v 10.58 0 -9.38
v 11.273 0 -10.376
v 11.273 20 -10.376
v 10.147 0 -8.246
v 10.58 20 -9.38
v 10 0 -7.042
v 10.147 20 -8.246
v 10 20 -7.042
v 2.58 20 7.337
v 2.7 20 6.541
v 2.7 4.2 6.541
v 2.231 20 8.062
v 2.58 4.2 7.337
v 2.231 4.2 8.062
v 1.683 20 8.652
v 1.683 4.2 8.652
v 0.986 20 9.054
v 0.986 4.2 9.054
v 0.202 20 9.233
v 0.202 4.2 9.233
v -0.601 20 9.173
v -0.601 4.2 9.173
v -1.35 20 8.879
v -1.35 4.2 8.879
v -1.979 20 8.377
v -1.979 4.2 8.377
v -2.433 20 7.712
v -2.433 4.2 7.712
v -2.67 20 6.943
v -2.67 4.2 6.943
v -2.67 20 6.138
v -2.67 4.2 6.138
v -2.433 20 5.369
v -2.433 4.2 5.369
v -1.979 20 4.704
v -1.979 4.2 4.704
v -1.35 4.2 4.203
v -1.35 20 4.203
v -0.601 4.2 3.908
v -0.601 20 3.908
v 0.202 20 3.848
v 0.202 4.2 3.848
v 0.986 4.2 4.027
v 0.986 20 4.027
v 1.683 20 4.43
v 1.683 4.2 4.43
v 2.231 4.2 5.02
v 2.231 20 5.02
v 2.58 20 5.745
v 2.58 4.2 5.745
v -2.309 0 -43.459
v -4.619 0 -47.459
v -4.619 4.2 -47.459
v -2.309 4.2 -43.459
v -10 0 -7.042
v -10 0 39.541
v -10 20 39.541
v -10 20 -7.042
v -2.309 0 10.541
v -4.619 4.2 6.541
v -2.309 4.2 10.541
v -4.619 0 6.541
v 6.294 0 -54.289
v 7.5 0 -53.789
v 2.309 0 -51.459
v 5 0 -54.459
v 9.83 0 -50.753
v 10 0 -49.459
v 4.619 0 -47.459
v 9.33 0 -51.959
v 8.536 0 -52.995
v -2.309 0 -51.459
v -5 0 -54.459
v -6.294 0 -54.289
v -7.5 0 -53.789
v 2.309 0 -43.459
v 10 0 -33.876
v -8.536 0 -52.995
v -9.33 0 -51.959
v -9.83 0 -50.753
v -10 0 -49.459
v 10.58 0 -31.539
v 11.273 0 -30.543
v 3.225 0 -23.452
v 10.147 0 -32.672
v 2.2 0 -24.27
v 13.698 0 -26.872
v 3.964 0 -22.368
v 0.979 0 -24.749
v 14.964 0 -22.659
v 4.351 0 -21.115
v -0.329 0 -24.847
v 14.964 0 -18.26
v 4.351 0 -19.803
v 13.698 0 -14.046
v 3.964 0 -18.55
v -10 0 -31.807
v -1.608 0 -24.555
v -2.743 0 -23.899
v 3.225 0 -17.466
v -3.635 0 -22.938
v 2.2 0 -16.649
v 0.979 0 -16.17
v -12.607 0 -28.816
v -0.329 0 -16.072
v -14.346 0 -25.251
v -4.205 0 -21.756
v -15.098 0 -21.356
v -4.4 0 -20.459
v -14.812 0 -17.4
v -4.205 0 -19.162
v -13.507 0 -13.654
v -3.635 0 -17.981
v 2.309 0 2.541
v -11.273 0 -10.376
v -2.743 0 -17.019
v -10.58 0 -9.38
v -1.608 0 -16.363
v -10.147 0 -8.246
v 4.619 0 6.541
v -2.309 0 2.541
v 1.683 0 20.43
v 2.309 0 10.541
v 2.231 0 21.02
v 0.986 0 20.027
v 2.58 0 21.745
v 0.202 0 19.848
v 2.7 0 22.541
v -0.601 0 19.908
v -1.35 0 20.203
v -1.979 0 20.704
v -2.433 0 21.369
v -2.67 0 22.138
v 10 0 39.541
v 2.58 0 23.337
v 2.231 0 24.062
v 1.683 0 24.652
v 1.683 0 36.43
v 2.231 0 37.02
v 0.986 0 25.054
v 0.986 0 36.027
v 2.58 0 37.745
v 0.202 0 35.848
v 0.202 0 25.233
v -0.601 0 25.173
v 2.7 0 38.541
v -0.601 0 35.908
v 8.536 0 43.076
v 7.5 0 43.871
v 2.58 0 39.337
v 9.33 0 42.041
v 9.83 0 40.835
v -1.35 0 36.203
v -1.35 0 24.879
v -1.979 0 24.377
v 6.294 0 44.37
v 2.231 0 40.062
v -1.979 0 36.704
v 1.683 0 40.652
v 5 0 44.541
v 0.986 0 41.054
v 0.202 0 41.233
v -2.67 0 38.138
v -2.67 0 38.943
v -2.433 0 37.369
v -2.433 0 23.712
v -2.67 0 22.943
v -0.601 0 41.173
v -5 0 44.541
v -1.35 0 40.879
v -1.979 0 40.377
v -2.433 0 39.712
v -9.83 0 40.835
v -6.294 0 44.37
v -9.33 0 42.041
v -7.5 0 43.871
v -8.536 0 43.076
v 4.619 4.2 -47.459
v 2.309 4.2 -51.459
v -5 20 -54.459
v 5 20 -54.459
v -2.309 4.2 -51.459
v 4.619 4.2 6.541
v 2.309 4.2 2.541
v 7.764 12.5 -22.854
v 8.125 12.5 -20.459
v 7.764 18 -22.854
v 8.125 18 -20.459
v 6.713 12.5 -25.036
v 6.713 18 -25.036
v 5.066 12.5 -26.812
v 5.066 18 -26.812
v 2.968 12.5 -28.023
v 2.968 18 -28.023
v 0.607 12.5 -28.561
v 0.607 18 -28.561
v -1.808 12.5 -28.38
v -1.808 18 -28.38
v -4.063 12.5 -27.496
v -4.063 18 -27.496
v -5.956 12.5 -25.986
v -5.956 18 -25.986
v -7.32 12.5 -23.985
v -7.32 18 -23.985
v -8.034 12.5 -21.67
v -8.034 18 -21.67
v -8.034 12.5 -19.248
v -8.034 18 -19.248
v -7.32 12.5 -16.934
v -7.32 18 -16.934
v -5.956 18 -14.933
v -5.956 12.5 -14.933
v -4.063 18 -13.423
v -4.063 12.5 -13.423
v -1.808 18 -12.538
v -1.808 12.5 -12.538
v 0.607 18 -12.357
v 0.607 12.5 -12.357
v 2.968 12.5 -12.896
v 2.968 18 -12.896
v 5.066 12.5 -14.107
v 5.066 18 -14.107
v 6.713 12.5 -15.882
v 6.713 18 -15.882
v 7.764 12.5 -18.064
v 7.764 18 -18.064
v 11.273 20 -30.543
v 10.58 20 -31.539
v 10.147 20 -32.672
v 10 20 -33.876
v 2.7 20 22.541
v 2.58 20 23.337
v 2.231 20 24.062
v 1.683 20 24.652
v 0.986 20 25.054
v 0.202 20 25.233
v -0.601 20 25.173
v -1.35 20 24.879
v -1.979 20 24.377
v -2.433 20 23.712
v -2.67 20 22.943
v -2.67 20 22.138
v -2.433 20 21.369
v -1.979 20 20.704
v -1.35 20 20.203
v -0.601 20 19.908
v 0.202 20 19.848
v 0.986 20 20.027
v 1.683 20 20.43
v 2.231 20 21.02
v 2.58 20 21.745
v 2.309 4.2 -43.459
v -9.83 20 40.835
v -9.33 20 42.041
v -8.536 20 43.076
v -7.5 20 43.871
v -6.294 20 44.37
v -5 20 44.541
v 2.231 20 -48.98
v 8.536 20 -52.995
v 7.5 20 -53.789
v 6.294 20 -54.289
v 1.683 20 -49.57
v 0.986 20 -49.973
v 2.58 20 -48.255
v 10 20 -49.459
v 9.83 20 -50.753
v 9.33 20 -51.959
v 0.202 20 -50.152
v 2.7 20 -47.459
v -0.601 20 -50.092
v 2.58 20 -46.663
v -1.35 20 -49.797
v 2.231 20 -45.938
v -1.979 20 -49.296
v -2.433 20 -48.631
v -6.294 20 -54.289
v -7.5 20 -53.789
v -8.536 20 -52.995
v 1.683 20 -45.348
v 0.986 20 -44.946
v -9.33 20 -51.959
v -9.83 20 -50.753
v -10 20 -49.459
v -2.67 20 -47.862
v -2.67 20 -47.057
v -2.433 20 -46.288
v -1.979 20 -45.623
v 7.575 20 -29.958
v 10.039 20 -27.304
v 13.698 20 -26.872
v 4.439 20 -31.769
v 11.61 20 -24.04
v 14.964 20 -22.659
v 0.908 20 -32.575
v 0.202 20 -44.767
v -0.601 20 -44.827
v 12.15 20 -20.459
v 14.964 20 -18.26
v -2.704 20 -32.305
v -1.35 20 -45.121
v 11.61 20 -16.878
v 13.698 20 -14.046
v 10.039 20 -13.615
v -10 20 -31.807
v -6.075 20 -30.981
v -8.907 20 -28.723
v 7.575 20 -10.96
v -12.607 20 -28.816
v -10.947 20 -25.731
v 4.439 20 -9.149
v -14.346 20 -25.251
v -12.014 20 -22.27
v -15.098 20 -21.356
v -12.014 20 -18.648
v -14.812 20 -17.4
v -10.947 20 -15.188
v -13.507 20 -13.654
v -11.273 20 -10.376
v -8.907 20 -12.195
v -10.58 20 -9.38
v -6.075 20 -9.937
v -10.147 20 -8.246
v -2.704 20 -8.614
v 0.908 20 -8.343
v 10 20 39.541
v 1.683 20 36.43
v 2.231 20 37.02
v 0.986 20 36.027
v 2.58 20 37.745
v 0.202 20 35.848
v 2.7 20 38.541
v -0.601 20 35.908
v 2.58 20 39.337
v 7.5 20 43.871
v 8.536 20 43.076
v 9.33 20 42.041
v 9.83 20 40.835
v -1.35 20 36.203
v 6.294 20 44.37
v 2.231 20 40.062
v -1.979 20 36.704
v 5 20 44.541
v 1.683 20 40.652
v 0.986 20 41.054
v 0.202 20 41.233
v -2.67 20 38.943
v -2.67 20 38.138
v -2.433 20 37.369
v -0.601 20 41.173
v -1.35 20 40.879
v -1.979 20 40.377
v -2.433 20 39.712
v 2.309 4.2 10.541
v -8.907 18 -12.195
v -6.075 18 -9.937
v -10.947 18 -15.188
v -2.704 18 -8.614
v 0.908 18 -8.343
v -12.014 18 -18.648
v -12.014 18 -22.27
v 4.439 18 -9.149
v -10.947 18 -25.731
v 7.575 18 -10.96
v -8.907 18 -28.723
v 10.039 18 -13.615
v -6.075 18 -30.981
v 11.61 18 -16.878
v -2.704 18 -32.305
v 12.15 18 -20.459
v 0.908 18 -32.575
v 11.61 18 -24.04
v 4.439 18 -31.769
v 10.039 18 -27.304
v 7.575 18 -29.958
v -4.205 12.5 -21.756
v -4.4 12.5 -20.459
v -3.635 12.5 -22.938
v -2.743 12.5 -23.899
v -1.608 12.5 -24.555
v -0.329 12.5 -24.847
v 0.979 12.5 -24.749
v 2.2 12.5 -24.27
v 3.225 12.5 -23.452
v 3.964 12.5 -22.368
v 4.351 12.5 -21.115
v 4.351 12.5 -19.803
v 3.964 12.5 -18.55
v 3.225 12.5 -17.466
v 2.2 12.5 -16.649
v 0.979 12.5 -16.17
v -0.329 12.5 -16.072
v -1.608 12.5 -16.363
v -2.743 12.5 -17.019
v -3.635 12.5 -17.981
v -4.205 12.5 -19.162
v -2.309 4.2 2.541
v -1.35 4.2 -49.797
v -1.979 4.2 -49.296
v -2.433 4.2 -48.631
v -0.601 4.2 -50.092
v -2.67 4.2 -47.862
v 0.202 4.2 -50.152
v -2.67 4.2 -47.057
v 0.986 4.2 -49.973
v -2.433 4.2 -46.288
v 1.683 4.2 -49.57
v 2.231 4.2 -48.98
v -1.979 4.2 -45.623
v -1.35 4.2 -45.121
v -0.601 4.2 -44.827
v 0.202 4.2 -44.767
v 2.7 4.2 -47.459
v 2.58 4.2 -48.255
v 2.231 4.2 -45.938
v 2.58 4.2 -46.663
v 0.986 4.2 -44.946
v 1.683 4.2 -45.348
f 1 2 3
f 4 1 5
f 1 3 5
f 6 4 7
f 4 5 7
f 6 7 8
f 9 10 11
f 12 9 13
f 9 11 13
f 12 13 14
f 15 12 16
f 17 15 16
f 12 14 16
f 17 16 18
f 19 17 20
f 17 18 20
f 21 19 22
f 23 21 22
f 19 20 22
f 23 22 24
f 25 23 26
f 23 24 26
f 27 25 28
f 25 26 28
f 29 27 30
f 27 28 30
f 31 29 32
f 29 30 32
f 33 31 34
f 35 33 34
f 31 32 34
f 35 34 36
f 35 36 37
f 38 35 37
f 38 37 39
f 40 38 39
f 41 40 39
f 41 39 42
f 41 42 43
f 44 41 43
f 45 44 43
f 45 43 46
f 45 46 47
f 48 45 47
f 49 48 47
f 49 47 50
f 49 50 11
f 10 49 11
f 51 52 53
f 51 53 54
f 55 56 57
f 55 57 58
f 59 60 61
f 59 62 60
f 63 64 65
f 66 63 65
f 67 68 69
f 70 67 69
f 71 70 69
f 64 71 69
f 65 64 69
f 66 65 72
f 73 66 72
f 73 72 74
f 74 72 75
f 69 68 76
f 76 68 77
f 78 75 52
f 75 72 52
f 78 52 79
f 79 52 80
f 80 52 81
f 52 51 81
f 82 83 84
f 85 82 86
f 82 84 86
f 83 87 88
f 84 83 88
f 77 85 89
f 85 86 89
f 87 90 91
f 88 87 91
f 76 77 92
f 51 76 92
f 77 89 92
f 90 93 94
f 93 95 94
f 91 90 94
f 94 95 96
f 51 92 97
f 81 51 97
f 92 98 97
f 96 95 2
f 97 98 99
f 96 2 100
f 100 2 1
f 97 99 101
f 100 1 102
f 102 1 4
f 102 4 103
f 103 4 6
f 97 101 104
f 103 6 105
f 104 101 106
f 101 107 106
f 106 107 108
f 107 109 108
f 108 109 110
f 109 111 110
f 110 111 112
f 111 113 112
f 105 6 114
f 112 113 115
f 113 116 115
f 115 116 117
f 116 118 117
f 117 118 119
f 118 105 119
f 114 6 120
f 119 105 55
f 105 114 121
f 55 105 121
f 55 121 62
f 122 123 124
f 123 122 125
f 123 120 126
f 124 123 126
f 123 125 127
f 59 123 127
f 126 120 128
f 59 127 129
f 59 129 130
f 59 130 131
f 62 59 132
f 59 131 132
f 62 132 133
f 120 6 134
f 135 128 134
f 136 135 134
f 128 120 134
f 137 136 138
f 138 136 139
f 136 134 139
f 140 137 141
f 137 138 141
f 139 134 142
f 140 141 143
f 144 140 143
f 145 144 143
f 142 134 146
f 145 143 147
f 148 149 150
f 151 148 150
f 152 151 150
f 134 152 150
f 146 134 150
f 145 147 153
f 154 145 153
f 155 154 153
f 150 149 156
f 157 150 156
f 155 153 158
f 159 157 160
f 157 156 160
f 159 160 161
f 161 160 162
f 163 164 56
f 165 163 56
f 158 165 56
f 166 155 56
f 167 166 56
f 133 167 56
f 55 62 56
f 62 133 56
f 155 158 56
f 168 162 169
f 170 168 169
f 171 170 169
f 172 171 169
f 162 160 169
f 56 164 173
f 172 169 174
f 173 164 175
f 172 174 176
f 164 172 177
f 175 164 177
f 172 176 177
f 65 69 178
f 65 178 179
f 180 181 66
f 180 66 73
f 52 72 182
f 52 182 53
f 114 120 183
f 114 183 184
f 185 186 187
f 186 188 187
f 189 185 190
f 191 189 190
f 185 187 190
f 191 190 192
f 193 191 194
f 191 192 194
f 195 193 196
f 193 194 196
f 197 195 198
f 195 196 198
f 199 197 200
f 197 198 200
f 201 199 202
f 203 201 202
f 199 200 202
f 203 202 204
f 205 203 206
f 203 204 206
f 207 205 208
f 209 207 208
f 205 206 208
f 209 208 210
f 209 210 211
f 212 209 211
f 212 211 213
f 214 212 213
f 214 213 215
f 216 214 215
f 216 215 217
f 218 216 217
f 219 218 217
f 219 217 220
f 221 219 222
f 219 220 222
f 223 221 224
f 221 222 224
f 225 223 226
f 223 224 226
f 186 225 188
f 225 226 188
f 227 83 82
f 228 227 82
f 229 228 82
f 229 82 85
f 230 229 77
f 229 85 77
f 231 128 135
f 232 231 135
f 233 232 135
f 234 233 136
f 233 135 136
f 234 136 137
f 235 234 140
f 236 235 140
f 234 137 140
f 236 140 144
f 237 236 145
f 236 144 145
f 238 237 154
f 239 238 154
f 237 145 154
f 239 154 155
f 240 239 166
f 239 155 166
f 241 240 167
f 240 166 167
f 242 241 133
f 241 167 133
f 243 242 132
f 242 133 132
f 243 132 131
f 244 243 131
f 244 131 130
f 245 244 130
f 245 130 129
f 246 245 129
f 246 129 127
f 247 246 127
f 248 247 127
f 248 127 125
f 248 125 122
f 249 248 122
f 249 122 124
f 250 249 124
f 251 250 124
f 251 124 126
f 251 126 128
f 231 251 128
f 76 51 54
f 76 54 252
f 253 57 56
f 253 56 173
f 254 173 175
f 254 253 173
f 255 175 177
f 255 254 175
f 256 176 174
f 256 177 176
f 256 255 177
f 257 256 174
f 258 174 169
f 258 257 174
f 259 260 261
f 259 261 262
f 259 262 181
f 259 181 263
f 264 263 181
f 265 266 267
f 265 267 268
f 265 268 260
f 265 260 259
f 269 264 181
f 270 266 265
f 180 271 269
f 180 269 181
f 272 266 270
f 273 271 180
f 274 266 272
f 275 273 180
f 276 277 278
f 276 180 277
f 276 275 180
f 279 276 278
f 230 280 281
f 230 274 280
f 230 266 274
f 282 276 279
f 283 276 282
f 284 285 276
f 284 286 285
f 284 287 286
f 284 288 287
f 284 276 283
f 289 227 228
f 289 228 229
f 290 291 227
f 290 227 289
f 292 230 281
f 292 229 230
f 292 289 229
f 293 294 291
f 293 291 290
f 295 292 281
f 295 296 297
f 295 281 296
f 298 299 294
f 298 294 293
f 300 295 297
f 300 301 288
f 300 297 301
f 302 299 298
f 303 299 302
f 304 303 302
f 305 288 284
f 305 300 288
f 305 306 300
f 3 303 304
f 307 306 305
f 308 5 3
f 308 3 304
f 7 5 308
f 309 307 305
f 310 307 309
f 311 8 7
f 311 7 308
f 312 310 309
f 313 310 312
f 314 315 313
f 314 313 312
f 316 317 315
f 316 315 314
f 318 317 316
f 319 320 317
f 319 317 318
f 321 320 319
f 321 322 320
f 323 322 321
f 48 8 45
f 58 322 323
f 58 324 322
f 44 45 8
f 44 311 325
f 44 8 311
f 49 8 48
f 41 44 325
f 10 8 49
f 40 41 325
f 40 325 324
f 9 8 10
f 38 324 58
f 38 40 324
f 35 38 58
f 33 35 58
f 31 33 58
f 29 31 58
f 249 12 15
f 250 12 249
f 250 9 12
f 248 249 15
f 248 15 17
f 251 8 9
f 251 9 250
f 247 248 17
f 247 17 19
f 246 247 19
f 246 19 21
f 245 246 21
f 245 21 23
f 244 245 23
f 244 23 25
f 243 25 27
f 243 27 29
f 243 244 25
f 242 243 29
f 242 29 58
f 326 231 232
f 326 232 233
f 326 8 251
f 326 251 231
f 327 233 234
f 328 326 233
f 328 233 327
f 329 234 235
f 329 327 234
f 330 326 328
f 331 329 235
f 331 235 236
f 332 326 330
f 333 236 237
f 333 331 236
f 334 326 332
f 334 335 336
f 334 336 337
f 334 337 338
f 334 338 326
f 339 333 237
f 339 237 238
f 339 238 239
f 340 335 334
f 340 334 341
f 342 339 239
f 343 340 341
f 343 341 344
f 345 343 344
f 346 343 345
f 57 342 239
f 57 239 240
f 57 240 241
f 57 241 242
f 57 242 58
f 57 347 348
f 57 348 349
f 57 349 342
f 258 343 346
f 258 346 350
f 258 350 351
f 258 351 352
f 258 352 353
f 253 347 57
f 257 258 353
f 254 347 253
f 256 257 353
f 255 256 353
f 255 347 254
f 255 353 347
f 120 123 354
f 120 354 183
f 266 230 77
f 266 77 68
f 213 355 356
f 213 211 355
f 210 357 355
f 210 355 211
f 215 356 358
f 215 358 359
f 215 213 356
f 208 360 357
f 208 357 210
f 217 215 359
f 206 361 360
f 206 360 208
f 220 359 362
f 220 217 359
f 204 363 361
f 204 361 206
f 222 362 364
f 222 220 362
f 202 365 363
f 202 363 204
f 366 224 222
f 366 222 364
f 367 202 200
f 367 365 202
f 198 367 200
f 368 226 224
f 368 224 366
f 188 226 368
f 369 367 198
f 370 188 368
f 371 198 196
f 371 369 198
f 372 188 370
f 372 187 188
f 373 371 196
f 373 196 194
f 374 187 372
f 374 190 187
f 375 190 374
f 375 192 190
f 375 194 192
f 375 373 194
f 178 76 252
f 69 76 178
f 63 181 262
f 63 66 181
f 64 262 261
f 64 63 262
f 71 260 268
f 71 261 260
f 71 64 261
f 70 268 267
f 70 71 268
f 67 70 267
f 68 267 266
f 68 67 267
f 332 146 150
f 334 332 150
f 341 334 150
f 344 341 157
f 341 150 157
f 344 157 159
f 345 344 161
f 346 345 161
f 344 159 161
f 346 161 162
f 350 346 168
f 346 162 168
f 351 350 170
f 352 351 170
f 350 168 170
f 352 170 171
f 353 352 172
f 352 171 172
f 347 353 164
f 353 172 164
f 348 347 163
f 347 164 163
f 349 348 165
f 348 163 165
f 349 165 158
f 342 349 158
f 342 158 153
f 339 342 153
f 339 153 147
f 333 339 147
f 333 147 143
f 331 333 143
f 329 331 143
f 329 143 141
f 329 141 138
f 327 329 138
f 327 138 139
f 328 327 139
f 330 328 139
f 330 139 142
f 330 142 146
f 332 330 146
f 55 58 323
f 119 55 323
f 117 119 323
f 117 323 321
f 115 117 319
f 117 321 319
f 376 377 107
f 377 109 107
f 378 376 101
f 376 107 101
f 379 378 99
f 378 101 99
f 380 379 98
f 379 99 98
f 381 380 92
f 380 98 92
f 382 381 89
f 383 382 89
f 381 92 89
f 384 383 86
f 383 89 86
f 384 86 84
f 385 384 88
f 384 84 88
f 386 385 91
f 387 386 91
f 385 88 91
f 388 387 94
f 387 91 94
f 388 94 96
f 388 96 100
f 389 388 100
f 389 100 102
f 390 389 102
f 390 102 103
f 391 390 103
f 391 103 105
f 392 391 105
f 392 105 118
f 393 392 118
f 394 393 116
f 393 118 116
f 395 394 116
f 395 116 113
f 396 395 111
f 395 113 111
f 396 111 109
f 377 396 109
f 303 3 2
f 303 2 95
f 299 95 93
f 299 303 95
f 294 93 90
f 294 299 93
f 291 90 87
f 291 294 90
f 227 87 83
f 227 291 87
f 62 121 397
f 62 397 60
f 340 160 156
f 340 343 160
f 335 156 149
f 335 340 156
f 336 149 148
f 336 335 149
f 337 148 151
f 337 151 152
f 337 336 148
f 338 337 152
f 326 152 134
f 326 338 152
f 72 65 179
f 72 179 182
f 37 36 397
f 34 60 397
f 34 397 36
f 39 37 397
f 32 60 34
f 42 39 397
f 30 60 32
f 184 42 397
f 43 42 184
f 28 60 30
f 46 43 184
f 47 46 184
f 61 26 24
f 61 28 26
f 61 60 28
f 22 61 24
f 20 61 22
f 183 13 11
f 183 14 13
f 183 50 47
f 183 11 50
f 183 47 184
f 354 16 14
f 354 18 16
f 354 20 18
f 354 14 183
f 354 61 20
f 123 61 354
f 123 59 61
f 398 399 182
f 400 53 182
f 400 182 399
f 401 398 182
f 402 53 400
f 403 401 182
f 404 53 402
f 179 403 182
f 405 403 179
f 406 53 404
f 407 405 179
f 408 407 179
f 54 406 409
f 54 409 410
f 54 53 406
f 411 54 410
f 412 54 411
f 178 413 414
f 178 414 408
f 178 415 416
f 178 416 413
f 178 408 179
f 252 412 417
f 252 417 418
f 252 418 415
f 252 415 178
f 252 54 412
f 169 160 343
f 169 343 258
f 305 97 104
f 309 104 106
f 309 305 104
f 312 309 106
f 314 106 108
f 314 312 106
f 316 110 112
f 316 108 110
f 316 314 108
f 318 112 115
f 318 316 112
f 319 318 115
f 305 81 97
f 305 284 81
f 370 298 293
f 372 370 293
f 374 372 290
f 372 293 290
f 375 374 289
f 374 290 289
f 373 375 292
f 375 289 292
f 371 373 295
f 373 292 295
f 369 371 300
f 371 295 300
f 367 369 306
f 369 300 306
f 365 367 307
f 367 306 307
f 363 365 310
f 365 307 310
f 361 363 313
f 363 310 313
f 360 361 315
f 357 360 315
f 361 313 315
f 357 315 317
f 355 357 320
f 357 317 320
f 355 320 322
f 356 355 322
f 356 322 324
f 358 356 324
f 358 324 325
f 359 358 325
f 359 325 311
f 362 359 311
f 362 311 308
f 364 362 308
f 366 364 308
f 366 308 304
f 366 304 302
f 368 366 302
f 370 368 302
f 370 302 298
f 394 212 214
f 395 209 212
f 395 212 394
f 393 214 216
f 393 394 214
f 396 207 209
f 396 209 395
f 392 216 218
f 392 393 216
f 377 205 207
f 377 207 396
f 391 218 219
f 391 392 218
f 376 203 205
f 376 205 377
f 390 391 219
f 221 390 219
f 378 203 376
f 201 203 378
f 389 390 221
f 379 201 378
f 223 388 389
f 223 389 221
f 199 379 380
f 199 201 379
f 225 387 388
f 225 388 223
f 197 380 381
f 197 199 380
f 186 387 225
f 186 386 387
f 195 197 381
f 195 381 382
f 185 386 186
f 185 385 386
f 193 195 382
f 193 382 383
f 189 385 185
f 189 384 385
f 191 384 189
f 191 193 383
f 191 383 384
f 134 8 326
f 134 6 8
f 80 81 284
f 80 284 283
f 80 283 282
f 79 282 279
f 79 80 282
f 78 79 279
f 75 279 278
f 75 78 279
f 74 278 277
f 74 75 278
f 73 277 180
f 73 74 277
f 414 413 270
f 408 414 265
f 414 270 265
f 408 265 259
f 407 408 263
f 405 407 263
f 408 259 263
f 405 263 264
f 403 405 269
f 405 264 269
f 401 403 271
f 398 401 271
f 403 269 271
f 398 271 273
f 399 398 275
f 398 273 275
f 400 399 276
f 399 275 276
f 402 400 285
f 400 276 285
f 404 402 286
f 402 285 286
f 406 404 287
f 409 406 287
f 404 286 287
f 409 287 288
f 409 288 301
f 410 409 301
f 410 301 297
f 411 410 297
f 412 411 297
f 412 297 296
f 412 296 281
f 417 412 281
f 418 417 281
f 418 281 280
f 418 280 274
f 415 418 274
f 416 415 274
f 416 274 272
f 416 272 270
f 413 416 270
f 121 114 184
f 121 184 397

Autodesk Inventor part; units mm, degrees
ref_plane "YZ Plane" through (0, 0, 0) normal (1, 0, 0) x (0, 1, 0)
ref_plane "XZ Plane" through (0, 0, 0) normal (0, 1, 0) x (-1, 0, 0)
ref_plane "XY Plane" through (0, 0, 0) normal (0, 0, 1) x (1, 0, 0)
sketch "Boceto1" plane through (0, 0, 0) normal (0, 1, 0) x (-1, 0, 0)
  line L0 (-10, 44.5408) -> (10, 44.5408)
  line L1 (10, 44.5408) -> (10, -27.9592)
  line L2 (10, -27.9592) -> (-10, -27.9592)
  line L3 (-10, -27.9592) -> (-10, 44.5408)
  line L4 (-10, 44.5408) -> (10, -27.9592) construction
  line L5 (10, 44.5408) -> (-10, -27.9592) construction
  circle A0 centre (0, -20.4592) radius 4.4
  point P0 (0, 8.2908)
  dimension "d1" = 20
  dimension "d2" = 8.8
  dimension "d3" = 7.5
  dimension "d26" = 65
extrude "Extrusión1" add sketch "Boceto1" along normal blind 20
sketch "Boceto2" plane through (0, 20, 0) normal (0, 1, 0) x (1, 0, 0)
  circle A0 centre (0, 20.4592) radius 4.4 projected
  circle A1 centre (0, 20.4592) radius 12.125
  point P0 (0, 0)
  dimension "d6" = 24.25
extrude "Extrusión2" cut sketch "Boceto2" against normal blind 2.5
sketch "Boceto3" plane through (0, 20, 0) normal (0, 1, 0) x (1, 0, 0)
  circle A0 centre (0, 20.4592) radius 4.4 projected
  circle A1 centre (0, 20.4592) radius 12.125
  circle A2 centre (0, 20.4592) radius 15.125
  line L0 (10, 27.316) -> (10, 13.6024) projected
  arc A3 (10, 27.316) -> (9.5271, 27.9592) centre (0, 20.4592) ccw projected
  line L1 (-9.5271, 27.9592) -> (9.5271, 27.9592) projected
  arc A4 (-9.5271, 27.9592) -> (-10, 27.316) centre (0, 20.4592) ccw projected
  line L2 (-10, 13.6024) -> (-10, 27.316) projected
  arc A5 (-10, 13.6024) -> (10, 13.6024) centre (0, 20.4592) ccw projected
  circle A6 centre (0, 20.4592) radius 4.4 projected
  point P0 (0, 0)
  point P1 (-10, 27.316)
  point P2 (10, 27.316)
  point P3 (9.5271, 27.9592)
  dimension "d9" = 3
extrude "Extrusión3" add sketch "Boceto3" against normal up to surface (20 mm away) contours A1 L0 | L1 A1 | A1 L2 | A2
sketch "Boceto4" plane through (0, 20, 0) normal (0, 1, 0) x (1, 0, 0)
  circle A0 centre (0, 20.4592) radius 4.4 projected
  circle A1 centre (0, 20.4592) radius 12.15
  point P0 (0, 0)
  dimension "d14" = 24.3
extrude "Extrusión4" cut sketch "Boceto4" against normal blind 2 contours A0 | A1
sketch "Boceto5" plane through (0, 17.5, 0) normal (0, 1, 0) x (1, 0, 0)
  line L0 (10, 27.316) -> (10, 13.6024) projected
  arc A0 (10, 27.316) -> (9.5271, 27.9592) centre (0, 20.4592) ccw projected
  line L1 (-9.5271, 27.9592) -> (9.5271, 27.9592) projected
  arc A1 (-9.5271, 27.9592) -> (-10, 27.316) centre (0, 20.4592) ccw projected
  line L2 (-10, 13.6024) -> (-10, 27.316) projected
  arc A2 (-10, 13.6024) -> (10, 13.6024) centre (0, 20.4592) ccw projected
  circle A3 centre (0, 20.4592) radius 4.4 projected
  point P0 (0, 0)
extrude "Extrusión5" add sketch "Boceto5" along normal up to surface (0.5 mm away)
sketch "Boceto6" plane through (0, 0, 0) normal (0, -1, 0) x (1, 0, 0)
  circle A0 centre (0, 38.5408) radius 2.7
  circle A1 centre (0, 22.5408) radius 2.7
  line L0 (-10, 44.5408) -> (10, 44.5408) projected
  circle A2 centre (0, 6.5408) radius 2.7
  point P0 (0, 0)
  dimension "d20" = 16
  dimension "d21" = 5.4
  dimension "d30" = 6
  dimension "d35" = 16
extrude "Extrusión6" cut sketch "Boceto6" against normal through all
sketch "Boceto8" plane through (0, 18, -20.4592) normal (0, 1, 0) x (1, 0, 0)
  circle A0 centre (0, 0) radius 4.4 projected
  circle A1 centre (0, 0) radius 8.125
  point P0 (0, -20.4592)
  dimension "d31" = 16.25
extrude "Extrusión8" cut sketch "Boceto8" against normal blind 5.5 contours A0 | A1
fillet "Empalme4" radius 5 4 edges at (10, 10, 44.5408) (-10, 10, 44.5408) (10, 10, -9.1117) (-10, 10, -9.1117)
sketch "Boceto9" plane through (0, 20, 0) normal (0, 1, 0) x (1, 0, 0)
  arc A0 (11.2733, 10.3756) -> (-11.2733, 10.3756) centre (0, 20.4592) ccw projected
  line L0 (-10, 31.8067) -> (10, 31.8067)
  line L1 (10, 31.8067) -> (10, 54.4592)
  line L2 (10, 54.4592) -> (-10, 54.4592)
  line L3 (-10, 54.4592) -> (-10, 31.8067)
  line L4 (-10, 7.0422) -> (-10, -39.5408) projected
  line L5 (10, -39.5408) -> (10, 7.0422) projected
  circle A1 centre (0, 20.4592) radius 21
  circle A2 centre (0, 47.4592) radius 2.7
  point P0 (0, 0)
  dimension "d36" = 42
  dimension "d37" = 34
  dimension "d38" = 5.4
  dimension "d39" = 7
extrude "Extrusión9" add sketch "Boceto9" against normal up to surface (20 mm away) contours A0 L3 A1 L1 | A1 L3 L2 L1
fillet "Empalme5" radius 5 3 edges at (10, 10, -31.8067) (10, 10, -54.4592) (-10, 10, -54.4592)
sketch "Boceto10" plane through (0, 0, 0) normal (0, -1, 0) x (1, 0, 0)
  circle A0 centre (0, -47.4592) radius 2.7 projected
  circle A1 centre (0, -47.4592) radius 4
  circle A2 centre (0, 6.5408) radius 2.7 projected
  circle A3 centre (0, 6.5408) radius 4
  line L0 (-4.6188, -47.4592) -> (-2.3094, -43.4592)
  line L1 (-2.3094, -43.4592) -> (2.3094, -43.4592)
  line L2 (2.3094, -43.4592) -> (4.6188, -47.4592)
  line L3 (4.6188, -47.4592) -> (2.3094, -51.4592)
  line L4 (2.3094, -51.4592) -> (-2.3094, -51.4592)
  line L5 (-2.3094, -51.4592) -> (-4.6188, -47.4592)
  line L6 (-4.6188, 6.5408) -> (-2.3094, 10.5408)
  line L7 (-2.3094, 10.5408) -> (2.3094, 10.5408)
  line L8 (2.3094, 10.5408) -> (4.6188, 6.5408)
  line L9 (4.6188, 6.5408) -> (2.3094, 2.5408)
  line L10 (2.3094, 2.5408) -> (-2.3094, 2.5408)
  line L11 (-2.3094, 2.5408) -> (-4.6188, 6.5408)
  point P0 (0, 0)
  dimension "d43" = 8
extrude "Extrusión10" cut sketch "Boceto10" against normal blind 4.2 contours A0 | A1 | A1 L2 L3 | A1 L1 L2 | L3 L4 A1 | A1 L0 L1 | L4 L5 A1 | A1 L5 L0 | A2 | A3 | A3 L8 L9 | A3 L7 L8 | L9 L10 A3 | A3 L6 L7 | L10 L11 A3 | A3 L11 L6
sketch "Boceto7" plane through (0, 0, 0) normal (0, -1, 0) x (1, 0, 0)
  circle A0 centre (0, -20.4592) radius 2.65 projected
  circle A1 centre (0, -20.4592) radius 4.05
  line L0 (0, -25.1357) -> (-4.05, -22.7975)
  line L1 (-4.05, -22.7975) -> (-4.05, -18.1209)
  line L2 (-4.05, -18.1209) -> (0, -15.7826)
  line L3 (0, -15.7826) -> (4.05, -18.1209)
  line L4 (4.05, -18.1209) -> (4.05, -22.7975)
  line L5 (4.05, -22.7975) -> (0, -25.1357)
  point P0 (0, 0)
  dimension "d27" = 8.1
properties part number "bottomsupport"
